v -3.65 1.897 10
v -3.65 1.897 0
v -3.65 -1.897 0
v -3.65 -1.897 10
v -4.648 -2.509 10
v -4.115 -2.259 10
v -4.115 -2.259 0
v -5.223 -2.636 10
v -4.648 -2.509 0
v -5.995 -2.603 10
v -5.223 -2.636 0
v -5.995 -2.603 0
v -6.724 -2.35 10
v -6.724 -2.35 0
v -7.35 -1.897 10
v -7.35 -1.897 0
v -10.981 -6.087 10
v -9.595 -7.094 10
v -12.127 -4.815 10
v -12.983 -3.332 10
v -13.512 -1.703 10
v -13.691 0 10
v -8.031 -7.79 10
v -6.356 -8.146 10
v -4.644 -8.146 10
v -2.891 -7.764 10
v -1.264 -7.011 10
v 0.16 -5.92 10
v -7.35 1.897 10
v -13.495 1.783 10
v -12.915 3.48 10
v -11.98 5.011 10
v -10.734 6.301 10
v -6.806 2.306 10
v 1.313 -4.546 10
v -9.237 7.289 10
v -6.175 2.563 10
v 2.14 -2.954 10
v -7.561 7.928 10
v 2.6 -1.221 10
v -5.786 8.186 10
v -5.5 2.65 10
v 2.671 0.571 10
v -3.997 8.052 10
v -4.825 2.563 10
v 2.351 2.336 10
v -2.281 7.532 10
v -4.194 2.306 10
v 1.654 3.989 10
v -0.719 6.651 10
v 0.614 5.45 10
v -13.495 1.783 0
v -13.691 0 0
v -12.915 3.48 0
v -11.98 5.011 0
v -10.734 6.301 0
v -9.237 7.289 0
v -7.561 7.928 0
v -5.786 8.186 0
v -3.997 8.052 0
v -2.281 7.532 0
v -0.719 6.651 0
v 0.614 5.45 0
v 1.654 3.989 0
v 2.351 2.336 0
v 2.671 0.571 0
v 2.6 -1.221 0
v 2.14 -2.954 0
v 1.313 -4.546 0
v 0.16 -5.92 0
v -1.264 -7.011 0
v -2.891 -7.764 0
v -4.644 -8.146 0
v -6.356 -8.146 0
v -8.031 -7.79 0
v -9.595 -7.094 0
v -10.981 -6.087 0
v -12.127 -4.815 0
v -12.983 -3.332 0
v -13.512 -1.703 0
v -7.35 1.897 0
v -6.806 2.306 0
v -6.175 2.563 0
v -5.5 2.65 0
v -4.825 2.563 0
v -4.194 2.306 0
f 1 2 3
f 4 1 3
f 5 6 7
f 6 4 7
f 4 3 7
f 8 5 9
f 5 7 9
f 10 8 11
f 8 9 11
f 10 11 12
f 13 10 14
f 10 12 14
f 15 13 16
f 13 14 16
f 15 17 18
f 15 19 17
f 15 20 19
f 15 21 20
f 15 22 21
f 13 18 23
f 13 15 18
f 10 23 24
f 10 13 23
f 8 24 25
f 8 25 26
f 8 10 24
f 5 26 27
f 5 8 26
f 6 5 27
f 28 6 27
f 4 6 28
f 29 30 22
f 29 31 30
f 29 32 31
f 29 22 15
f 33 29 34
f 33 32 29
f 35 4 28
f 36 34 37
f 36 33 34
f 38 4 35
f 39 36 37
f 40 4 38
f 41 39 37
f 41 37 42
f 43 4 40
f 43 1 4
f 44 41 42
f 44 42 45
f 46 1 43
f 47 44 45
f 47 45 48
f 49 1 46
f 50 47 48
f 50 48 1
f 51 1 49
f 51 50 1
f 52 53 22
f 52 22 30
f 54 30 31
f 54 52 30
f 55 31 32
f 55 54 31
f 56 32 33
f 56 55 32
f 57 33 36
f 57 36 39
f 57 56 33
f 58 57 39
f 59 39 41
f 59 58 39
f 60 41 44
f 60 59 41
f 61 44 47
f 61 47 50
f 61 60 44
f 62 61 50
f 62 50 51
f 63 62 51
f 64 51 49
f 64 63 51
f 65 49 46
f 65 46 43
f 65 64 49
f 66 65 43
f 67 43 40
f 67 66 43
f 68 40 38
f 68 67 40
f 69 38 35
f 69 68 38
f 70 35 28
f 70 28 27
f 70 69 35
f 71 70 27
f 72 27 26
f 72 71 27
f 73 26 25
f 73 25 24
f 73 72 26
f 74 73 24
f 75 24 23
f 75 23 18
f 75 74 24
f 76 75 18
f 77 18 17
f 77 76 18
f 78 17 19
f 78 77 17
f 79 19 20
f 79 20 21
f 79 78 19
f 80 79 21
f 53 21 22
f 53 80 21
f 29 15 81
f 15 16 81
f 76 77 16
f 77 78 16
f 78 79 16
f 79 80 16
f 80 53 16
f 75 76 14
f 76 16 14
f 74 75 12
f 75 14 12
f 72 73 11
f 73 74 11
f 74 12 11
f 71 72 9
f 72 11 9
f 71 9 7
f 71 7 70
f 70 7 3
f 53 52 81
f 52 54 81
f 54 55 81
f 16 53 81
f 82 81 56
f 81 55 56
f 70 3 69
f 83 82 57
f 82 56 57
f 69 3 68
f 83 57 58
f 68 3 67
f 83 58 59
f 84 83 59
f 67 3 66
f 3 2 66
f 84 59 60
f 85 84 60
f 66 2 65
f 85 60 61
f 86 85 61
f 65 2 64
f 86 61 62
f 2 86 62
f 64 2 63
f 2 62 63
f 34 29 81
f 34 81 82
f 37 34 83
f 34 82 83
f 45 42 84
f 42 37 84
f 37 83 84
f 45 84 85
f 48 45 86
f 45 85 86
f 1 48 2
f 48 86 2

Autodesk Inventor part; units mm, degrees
ref_plane "YZ Plane" through (0, 0, 0) normal (1, 0, 0) x (0, 1, 0)
ref_plane "XZ Plane" through (0, 0, 0) normal (0, 1, 0) x (-1, 0, 0)
ref_plane "XY Plane" through (0, 0, 0) normal (0, 0, 1) x (1, 0, 0)
sketch "Sketch1" plane through (0, 0, 0) normal (0, 0, 1) x (1, 0, 0)
  line L0 (0.2752, -3.536) -> (0.7321, -4.3005) projected
  arc A0 (0.5159, -4.5981) -> (0.7321, -4.3005) centre (0.5604, -4.4031) ccw projected
  line L1 (0.5159, -4.5981) -> (-0.3524, -4.3999) projected
  arc A1 (-0.3524, -4.3999) -> (-0.5862, -4.6595) centre (-0.3969, -4.5949) ccw projected
  line L2 (-0.5862, -4.6595) -> (-0.2983, -5.5023) projected
  arc A2 (-0.5716, -5.7484) -> (-0.2983, -5.5023) centre (-0.4875, -5.5669) ccw projected
  line L3 (-0.5716, -5.7484) -> (-1.3796, -5.374) projected
  arc A3 (-1.3796, -5.374) -> (-1.6623, -5.5793) centre (-1.4637, -5.5554) ccw projected
  line L4 (-1.6623, -5.5793) -> (-1.5559, -6.4635) projected
  arc A4 (-1.8745, -6.6475) -> (-1.5559, -6.4635) centre (-1.7545, -6.4874) ccw projected
  line L5 (-1.8745, -6.6475) -> (-2.587, -6.1132) projected
  arc A5 (-2.587, -6.1132) -> (-2.9062, -6.2553) centre (-2.707, -6.2732) ccw projected
  line L6 (-2.9062, -6.2553) -> (-2.9859, -7.1423) projected
  arc A6 (-3.3358, -7.256) -> (-2.9859, -7.1423) centre (-3.1851, -7.1244) ccw projected
  line L7 (-3.3358, -7.256) -> (-3.9217, -6.5853) projected
  arc A7 (-3.9217, -6.5853) -> (-4.2634, -6.6579) centre (-4.0723, -6.7169) ccw projected
  line L8 (-4.2634, -6.6579) -> (-4.5259, -7.5089) projected
  arc A8 (-4.8917, -7.5474) -> (-4.5259, -7.5089) centre (-4.717, -7.45) ccw projected
  line L9 (-4.8917, -7.5474) -> (-5.3253, -6.7695) projected
  arc A9 (-5.3253, -6.7695) -> (-5.6747, -6.7695) centre (-5.5, -6.8669) ccw projected
  line L10 (-5.6747, -6.7695) -> (-6.1083, -7.5474) projected
  arc A10 (-6.4741, -7.5089) -> (-6.1083, -7.5474) centre (-6.283, -7.45) ccw projected
  line L11 (-6.4741, -7.5089) -> (-6.7366, -6.6579) projected
  arc A11 (-6.7366, -6.6579) -> (-7.0783, -6.5853) centre (-6.9277, -6.7169) ccw projected
  line L12 (-7.0783, -6.5853) -> (-7.6642, -7.256) projected
  arc A12 (-8.0141, -7.1423) -> (-7.6642, -7.256) centre (-7.8149, -7.1244) ccw projected
  line L13 (-8.0141, -7.1423) -> (-8.0938, -6.2553) projected
  arc A13 (-8.0938, -6.2553) -> (-8.413, -6.1132) centre (-8.293, -6.2732) ccw projected
  line L14 (-8.413, -6.1132) -> (-9.1255, -6.6475) projected
  arc A14 (-9.4441, -6.4635) -> (-9.1255, -6.6475) centre (-9.2455, -6.4874) ccw projected
  line L15 (-9.4441, -6.4635) -> (-9.3377, -5.5793) projected
  arc A15 (-9.3377, -5.5793) -> (-9.6204, -5.374) centre (-9.5363, -5.5554) ccw projected
  line L16 (-9.6204, -5.374) -> (-10.4284, -5.7484) projected
  arc A16 (-10.7017, -5.5023) -> (-10.4284, -5.7484) centre (-10.5125, -5.5669) ccw projected
  line L17 (-10.7017, -5.5023) -> (-10.4138, -4.6595) projected
  arc A17 (-10.4138, -4.6595) -> (-10.6476, -4.3999) centre (-10.6031, -4.5949) ccw projected
  line L18 (-10.6476, -4.3999) -> (-11.5159, -4.5981) projected
  arc A18 (-11.7321, -4.3005) -> (-11.5159, -4.5981) centre (-11.5604, -4.4031) ccw projected
  line L19 (-11.7321, -4.3005) -> (-11.2752, -3.536) projected
  arc A19 (-11.2752, -3.536) -> (-11.4499, -3.2335) centre (-11.4469, -3.4335) ccw projected
  line L20 (-11.4499, -3.2335) -> (-12.3404, -3.2469) projected
  arc A20 (-12.49, -2.9108) -> (-12.3404, -3.2469) centre (-12.3434, -3.0469) ccw projected
  line L21 (-12.49, -2.9108) -> (-11.8842, -2.258) projected
  arc A21 (-11.8842, -2.258) -> (-11.9922, -1.9258) centre (-12.0308, -2.122) ccw projected
  line L22 (-11.9922, -1.9258) -> (-12.866, -1.7537) projected
  arc A22 (-12.9425, -1.3939) -> (-12.866, -1.7537) centre (-12.8273, -1.5575) ccw projected
  line L23 (-12.9425, -1.3939) -> (-12.2142, -0.8813) projected
  arc A23 (-12.2142, -0.8813) -> (-12.2507, -0.5339) centre (-12.3293, -0.7178) ccw projected
  line L24 (-12.2507, -0.5339) -> (-13.0696, -0.1839) projected
  arc A24 (-13.0696, 0.1839) -> (-13.0696, -0.1839) centre (-12.991, 0) ccw projected
  line L25 (-13.0696, 0.1839) -> (-12.2507, 0.5339) projected
  arc A25 (-12.2507, 0.5339) -> (-12.2142, 0.8813) centre (-12.3293, 0.7178) ccw projected
  line L26 (-12.2142, 0.8813) -> (-12.9425, 1.3939) projected
  arc A26 (-12.866, 1.7537) -> (-12.9425, 1.3939) centre (-12.8273, 1.5575) ccw projected
  line L27 (-12.866, 1.7537) -> (-11.9922, 1.9258) projected
  arc A27 (-11.9922, 1.9258) -> (-11.8842, 2.258) centre (-12.0308, 2.122) ccw projected
  line L28 (-11.8842, 2.258) -> (-12.49, 2.9108) projected
  arc A28 (-12.3404, 3.2469) -> (-12.49, 2.9108) centre (-12.3434, 3.0469) ccw projected
  line L29 (-12.3404, 3.2469) -> (-11.4499, 3.2335) projected
  arc A29 (-11.4499, 3.2335) -> (-11.2752, 3.536) centre (-11.4469, 3.4335) ccw projected
  line L30 (-11.2752, 3.536) -> (-11.7321, 4.3005) projected
  arc A30 (-11.5159, 4.5981) -> (-11.7321, 4.3005) centre (-11.5604, 4.4031) ccw projected
  line L31 (-11.5159, 4.5981) -> (-10.6476, 4.3999) projected
  arc A31 (-10.6476, 4.3999) -> (-10.4138, 4.6595) centre (-10.6031, 4.5949) ccw projected
  line L32 (-10.4138, 4.6595) -> (-10.7017, 5.5023) projected
  arc A32 (-10.4284, 5.7484) -> (-10.7017, 5.5023) centre (-10.5125, 5.5669) ccw projected
  line L33 (-10.4284, 5.7484) -> (-9.6204, 5.374) projected
  arc A33 (-9.6204, 5.374) -> (-9.3377, 5.5793) centre (-9.5363, 5.5554) ccw projected
  line L34 (-9.3377, 5.5793) -> (-9.4441, 6.4635) projected
  arc A34 (-9.1255, 6.6475) -> (-9.4441, 6.4635) centre (-9.2455, 6.4874) ccw projected
  line L35 (-9.1255, 6.6475) -> (-8.413, 6.1132) projected
  arc A35 (-8.413, 6.1132) -> (-8.0938, 6.2553) centre (-8.293, 6.2732) ccw projected
  line L36 (-8.0938, 6.2553) -> (-8.0141, 7.1423) projected
  arc A36 (-7.6642, 7.256) -> (-8.0141, 7.1423) centre (-7.8149, 7.1244) ccw projected
  line L37 (-7.6642, 7.256) -> (-7.0783, 6.5853) projected
  arc A37 (-7.0783, 6.5853) -> (-6.7366, 6.6579) centre (-6.9277, 6.7169) ccw projected
  line L38 (-6.7366, 6.6579) -> (-6.4741, 7.5089) projected
  arc A38 (-6.1083, 7.5474) -> (-6.4741, 7.5089) centre (-6.283, 7.45) ccw projected
  line L39 (-6.1083, 7.5474) -> (-5.6747, 6.7695) projected
  arc A39 (-5.6747, 6.7695) -> (-5.3253, 6.7695) centre (-5.5, 6.8669) ccw projected
  line L40 (-5.3253, 6.7695) -> (-4.8917, 7.5474) projected
  arc A40 (-4.5259, 7.5089) -> (-4.8917, 7.5474) centre (-4.717, 7.45) ccw projected
  line L41 (-4.5259, 7.5089) -> (-4.2634, 6.6579) projected
  arc A41 (-4.2634, 6.6579) -> (-3.9217, 6.5853) centre (-4.0723, 6.7169) ccw projected
  line L42 (-3.9217, 6.5853) -> (-3.3358, 7.256) projected
  arc A42 (-2.9859, 7.1423) -> (-3.3358, 7.256) centre (-3.1851, 7.1244) ccw projected
  line L43 (-2.9859, 7.1423) -> (-2.9062, 6.2553) projected
  arc A43 (-2.9062, 6.2553) -> (-2.587, 6.1132) centre (-2.707, 6.2732) ccw projected
  line L44 (-2.587, 6.1132) -> (-1.8745, 6.6475) projected
  arc A44 (-1.5559, 6.4635) -> (-1.8745, 6.6475) centre (-1.7545, 6.4874) ccw projected
  line L45 (-1.5559, 6.4635) -> (-1.6623, 5.5793) projected
  arc A45 (-1.6623, 5.5793) -> (-1.3796, 5.374) centre (-1.4637, 5.5554) ccw projected
  line L46 (-1.3796, 5.374) -> (-0.5716, 5.7484) projected
  arc A46 (-0.2983, 5.5023) -> (-0.5716, 5.7484) centre (-0.4875, 5.5669) ccw projected
  line L47 (-0.2983, 5.5023) -> (-0.5862, 4.6595) projected
  arc A47 (-0.5862, 4.6595) -> (-0.3524, 4.3999) centre (-0.3969, 4.5949) ccw projected
  line L48 (-0.3524, 4.3999) -> (0.5159, 4.5981) projected
  arc A48 (0.7321, 4.3005) -> (0.5159, 4.5981) centre (0.5604, 4.4031) ccw projected
  line L49 (0.7321, 4.3005) -> (0.2752, 3.536) projected
  arc A49 (0.2752, 3.536) -> (0.4499, 3.2335) centre (0.4469, 3.4335) ccw projected
  line L50 (0.4499, 3.2335) -> (1.3404, 3.2469) projected
  arc A50 (1.49, 2.9108) -> (1.3404, 3.2469) centre (1.3434, 3.0469) ccw projected
  line L51 (1.49, 2.9108) -> (0.8842, 2.258) projected
  arc A51 (0.8842, 2.258) -> (0.9922, 1.9258) centre (1.0308, 2.122) ccw projected
  line L52 (0.9922, 1.9258) -> (1.866, 1.7537) projected
  arc A52 (1.9425, 1.3939) -> (1.866, 1.7537) centre (1.8273, 1.5575) ccw projected
  line L53 (1.9425, 1.3939) -> (1.2142, 0.8813) projected
  arc A53 (1.2142, 0.8813) -> (1.2507, 0.5339) centre (1.3293, 0.7178) ccw projected
  line L54 (1.2507, 0.5339) -> (2.0696, 0.1839) projected
  arc A54 (2.0696, -0.1839) -> (2.0696, 0.1839) centre (1.991, 0) ccw projected
  line L55 (2.0696, -0.1839) -> (1.2507, -0.5339) projected
  arc A55 (1.2507, -0.5339) -> (1.2142, -0.8813) centre (1.3293, -0.7178) ccw projected
  line L56 (1.2142, -0.8813) -> (1.9425, -1.3939) projected
  arc A56 (1.866, -1.7537) -> (1.9425, -1.3939) centre (1.8273, -1.5575) ccw projected
  line L57 (1.866, -1.7537) -> (0.9922, -1.9258) projected
  arc A57 (0.9922, -1.9258) -> (0.8842, -2.258) centre (1.0308, -2.122) ccw projected
  line L58 (0.8842, -2.258) -> (1.49, -2.9108) projected
  arc A58 (1.3404, -3.2469) -> (1.49, -2.9108) centre (1.3434, -3.0469) ccw projected
  line L59 (1.3404, -3.2469) -> (0.4499, -3.2335) projected
  arc A59 (0.4499, -3.2335) -> (0.2752, -3.536) centre (0.4469, -3.4335) ccw projected
  circle A60 centre (-5.5, 0) radius 5.5 projected
  circle A61 centre (-5.5, 0) radius 5.5 projected
  circle A62 centre (-5.5, 0) radius 3.15 projected
  line L60 (-5.5, 0) -> (-4.6961, -7.6489)
  line L61 (-4.6961, -7.6489) -> (-4.5915, -8.6434)
  circle A63 centre (-5.5, 0) radius 8.691
  line L62 (-7.35, -1.8974) -> (-7.35, 1.8974) projected
  arc A64 (-7.35, -1.8974) -> (-3.65, -1.8974) centre (-5.5, 0) ccw projected
  line L63 (-3.65, 1.8974) -> (-3.65, -1.8974) projected
  arc A65 (-3.65, 1.8974) -> (-7.35, 1.8974) centre (-5.5, 0) ccw projected
  circle A66 centre (-5.5, 0) radius 1 projected
  point P0 (0, 0)
  dimension "d0" = 1
extrude "Extrusion1" add sketch "Sketch1" along normal blind 10 contours A63 | A62 | A60 | L0 A0 L1 A1 L2 A2 L3 A3 L4 A4 L5 A5 L6 A6 L7 A7 L8 A8 L9 A9 L10 A10 L11 A11 L12 A12 L13 A13 L14 A14 L15 A15 L16 A16 L17 A17 L18 A18 L19 A19 L20 A20 L21 A21 L22 A22 L23 A23 L24 A24 L25 A25 L26 A26 L27 A27 L28 A28 L29 A29 L30 A30 L31 A31 L32 A32 L33 A33 L34 A34 L35 A35 L36 A36 L37 A37 L38 A38 L39 A39 L40 A40 L41 A41 L42 A42 L43 A43 L44 A44 L45 A45 L46 A46 L47 A47 L48 A48 L49 A49 L50 A50 L51 A51 L52 A52 L53 A53 L54 A54 L55 A55 L56 A56 L57 A57 L58 A58 L59 A59
sketch "Sketch2" plane through (-5.5, 0, 0) normal (0, 0, -1) x (-1, 0, 0)
  circle A0 centre (0, 0) radius 8.691 projected
  arc A1 (-1.85, -1.8974) -> (1.85, -1.8974) centre (0, 0) ccw projected
  line L0 (-1.85, 1.8974) -> (-1.85, -1.8974) projected
  arc A2 (1.85, 1.8974) -> (-1.85, 1.8974) centre (0, 0) ccw projected
  line L1 (1.85, -1.8974) -> (1.85, 1.8974) projected
  circle A3 centre (0, 0) radius 8.691 projected
  line L2 (0, -8.691) -> (0, -8.191)
  circle A4 centre (0, 0) radius 8.191
  point P0 (-5.5, 0)
  dimension "d3" = 0.5
extrude "Extrusion2" cut sketch "Sketch2" against normal through all contours A0
properties part number "kokoko"
